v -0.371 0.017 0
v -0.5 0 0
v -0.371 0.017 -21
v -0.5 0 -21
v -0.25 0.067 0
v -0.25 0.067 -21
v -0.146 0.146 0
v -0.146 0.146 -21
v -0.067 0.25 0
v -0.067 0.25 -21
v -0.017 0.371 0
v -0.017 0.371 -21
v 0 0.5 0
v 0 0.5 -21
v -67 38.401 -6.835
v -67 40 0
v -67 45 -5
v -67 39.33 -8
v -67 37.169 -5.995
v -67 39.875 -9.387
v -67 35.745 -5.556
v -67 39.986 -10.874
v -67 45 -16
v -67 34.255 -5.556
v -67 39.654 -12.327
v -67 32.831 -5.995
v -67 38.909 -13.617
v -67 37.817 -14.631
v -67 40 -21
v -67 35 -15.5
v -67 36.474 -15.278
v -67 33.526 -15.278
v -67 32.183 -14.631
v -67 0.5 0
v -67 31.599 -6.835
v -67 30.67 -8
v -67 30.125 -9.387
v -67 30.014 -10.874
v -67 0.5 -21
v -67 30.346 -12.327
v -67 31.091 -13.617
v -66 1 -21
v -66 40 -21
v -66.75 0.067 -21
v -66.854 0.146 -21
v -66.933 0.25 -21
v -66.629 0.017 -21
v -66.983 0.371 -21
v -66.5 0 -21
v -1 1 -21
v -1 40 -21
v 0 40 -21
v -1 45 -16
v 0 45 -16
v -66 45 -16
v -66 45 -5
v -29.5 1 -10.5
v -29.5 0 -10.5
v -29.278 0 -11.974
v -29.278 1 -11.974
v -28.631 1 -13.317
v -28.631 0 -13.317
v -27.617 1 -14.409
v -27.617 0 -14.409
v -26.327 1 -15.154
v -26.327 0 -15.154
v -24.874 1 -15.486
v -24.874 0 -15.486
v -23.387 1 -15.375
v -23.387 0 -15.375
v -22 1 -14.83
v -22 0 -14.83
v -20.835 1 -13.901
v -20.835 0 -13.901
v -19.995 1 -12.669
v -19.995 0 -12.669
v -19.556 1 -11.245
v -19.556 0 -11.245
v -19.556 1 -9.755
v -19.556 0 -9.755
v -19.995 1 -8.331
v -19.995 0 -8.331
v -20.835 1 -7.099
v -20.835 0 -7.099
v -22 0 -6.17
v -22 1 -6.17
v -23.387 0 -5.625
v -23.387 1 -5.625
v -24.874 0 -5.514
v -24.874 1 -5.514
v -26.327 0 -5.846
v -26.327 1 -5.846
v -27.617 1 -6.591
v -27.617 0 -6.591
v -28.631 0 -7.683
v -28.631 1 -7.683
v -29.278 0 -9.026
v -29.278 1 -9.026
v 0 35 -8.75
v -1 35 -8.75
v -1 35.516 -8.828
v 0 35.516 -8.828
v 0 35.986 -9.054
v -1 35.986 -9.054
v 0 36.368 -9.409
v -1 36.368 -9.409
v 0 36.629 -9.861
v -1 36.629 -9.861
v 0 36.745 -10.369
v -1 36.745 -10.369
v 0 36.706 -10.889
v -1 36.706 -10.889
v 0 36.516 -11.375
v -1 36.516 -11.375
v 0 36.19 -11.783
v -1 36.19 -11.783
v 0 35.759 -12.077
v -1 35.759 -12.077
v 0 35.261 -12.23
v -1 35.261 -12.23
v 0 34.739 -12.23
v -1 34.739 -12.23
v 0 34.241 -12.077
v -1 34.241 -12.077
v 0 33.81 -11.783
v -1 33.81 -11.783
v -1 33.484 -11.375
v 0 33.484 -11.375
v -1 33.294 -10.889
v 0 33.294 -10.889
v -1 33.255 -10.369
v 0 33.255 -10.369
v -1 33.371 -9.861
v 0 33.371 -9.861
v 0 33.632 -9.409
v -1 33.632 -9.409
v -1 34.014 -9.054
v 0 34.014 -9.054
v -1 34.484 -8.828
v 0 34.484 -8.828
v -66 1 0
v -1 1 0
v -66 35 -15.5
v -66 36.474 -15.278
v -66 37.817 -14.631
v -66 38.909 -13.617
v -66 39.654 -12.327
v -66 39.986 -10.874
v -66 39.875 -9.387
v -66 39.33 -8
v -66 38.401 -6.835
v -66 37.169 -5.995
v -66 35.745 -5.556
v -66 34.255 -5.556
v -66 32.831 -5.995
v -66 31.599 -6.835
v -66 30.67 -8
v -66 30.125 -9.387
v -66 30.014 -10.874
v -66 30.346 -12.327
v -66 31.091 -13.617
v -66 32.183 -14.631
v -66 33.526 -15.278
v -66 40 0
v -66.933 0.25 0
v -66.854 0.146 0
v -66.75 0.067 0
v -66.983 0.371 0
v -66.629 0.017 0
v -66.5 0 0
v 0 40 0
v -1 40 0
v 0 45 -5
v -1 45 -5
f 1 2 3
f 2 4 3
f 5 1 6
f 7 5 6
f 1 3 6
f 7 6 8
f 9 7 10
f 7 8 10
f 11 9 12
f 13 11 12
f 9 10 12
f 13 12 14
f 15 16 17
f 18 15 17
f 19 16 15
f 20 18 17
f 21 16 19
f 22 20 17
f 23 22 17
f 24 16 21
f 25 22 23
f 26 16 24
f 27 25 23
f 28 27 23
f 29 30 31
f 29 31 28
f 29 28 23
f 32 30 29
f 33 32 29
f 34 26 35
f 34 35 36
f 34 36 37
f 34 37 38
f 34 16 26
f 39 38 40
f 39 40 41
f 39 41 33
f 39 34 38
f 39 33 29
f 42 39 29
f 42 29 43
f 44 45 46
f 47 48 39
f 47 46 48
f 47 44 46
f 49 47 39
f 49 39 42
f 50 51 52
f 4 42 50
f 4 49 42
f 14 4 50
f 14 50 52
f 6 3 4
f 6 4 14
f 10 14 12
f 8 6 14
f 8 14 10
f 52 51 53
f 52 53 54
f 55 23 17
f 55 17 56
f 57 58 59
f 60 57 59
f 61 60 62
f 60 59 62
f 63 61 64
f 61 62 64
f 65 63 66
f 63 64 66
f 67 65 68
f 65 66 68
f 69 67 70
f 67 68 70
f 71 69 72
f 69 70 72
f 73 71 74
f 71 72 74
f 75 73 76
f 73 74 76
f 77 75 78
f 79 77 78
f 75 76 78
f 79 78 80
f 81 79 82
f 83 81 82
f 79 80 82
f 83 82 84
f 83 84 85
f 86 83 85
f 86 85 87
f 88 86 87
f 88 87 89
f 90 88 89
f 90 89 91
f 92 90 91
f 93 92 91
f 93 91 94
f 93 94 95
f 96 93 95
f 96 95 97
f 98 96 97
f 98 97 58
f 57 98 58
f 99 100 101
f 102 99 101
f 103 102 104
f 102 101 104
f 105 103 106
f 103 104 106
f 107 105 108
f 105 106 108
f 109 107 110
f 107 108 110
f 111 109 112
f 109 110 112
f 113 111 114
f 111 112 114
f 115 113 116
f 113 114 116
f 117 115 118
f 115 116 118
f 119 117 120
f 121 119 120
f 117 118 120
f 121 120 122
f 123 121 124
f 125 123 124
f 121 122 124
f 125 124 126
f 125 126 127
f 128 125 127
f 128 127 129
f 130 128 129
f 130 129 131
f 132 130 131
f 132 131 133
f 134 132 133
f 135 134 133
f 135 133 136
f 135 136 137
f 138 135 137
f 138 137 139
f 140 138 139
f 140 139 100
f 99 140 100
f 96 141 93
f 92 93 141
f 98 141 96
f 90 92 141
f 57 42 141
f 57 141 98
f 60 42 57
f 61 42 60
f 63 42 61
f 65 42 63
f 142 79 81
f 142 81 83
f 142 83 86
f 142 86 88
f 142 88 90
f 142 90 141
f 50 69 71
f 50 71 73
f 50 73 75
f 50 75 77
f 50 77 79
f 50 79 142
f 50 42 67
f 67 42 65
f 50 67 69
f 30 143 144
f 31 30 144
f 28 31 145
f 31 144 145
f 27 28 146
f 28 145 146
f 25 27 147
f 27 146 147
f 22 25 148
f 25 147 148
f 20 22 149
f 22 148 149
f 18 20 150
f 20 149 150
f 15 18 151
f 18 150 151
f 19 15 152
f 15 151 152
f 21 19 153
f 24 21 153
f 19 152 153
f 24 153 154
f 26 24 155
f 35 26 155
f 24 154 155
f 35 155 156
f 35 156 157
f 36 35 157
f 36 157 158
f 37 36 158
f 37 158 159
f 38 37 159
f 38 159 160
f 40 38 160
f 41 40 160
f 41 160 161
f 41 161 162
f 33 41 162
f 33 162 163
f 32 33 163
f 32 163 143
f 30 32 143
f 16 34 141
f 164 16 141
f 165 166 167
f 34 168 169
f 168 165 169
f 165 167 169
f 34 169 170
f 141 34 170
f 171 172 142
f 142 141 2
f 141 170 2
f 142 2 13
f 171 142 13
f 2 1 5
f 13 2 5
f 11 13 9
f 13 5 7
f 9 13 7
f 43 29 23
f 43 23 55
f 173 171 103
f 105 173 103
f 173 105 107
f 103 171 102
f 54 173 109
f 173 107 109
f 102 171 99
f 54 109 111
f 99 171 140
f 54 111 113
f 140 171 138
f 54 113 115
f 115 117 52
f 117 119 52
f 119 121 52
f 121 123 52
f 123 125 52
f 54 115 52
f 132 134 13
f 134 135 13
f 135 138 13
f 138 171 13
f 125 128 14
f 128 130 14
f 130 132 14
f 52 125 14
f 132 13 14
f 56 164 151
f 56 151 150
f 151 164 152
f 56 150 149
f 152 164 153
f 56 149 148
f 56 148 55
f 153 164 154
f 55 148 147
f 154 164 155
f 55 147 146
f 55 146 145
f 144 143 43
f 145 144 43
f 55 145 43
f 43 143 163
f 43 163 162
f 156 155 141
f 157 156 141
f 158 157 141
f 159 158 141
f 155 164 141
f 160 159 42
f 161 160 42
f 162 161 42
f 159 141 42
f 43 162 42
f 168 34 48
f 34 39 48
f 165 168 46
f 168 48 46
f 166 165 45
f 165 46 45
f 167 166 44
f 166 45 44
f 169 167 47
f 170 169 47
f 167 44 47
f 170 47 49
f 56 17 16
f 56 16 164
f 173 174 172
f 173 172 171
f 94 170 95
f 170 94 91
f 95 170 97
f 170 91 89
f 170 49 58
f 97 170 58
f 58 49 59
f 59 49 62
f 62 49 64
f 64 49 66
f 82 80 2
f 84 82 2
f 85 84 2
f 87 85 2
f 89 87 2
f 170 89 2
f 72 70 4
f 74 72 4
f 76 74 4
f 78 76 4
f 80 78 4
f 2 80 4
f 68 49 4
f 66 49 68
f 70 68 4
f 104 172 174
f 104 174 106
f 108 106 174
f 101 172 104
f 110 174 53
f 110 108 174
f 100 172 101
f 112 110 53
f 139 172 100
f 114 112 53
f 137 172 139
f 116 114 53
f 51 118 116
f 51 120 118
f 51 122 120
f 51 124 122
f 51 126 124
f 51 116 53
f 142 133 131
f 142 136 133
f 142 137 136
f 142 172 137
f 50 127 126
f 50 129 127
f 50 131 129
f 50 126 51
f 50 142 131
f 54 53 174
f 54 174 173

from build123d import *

# Parameters (mm, degrees)
SKETCH_1_W                  = 67
SKETCH_1_H                  = 21
EXTRUDE_1_DEPTH             = 45
SHELL_1_T                   = -1
FILLET_1_R                  = 0.5
CHAMFER_1_SIZE              = 5
HOLE_WIZARD_10_0_10_1_D     = 10
HOLE_WIZARD_10_0_10_1_DEPTH = 1
HOLE_WIZARD_10_0_10_2_D     = 10
HOLE_WIZARD_3_5_3_5_1_D     = 3.5


with BuildPart() as part:
    # 草图1 → 凸台-拉伸1 (new body)
    with BuildSketch(Plane(origin=(0, 0, 0), x_dir=(1, 0, 0), z_dir=(0, 1, 0))):
        with Locations((-33.5, 10.5)):
            Rectangle(SKETCH_1_W, SKETCH_1_H)
    extrude(amount=EXTRUDE_1_DEPTH)

    # 抽壳1
    shell_1_openings = [part.faces().sort_by_distance(p)[0] for p in [
        (-33.5, 45, -10.5),
        (-33.5, 22.5, 0),
        (-33.5, 22.5, -21),
    ]]
    offset(amount=SHELL_1_T, openings=shell_1_openings, kind=Kind.INTERSECTION)

    # 圆角1
    fillet_1_edges = [part.edges().sort_by_distance(p)[0] for p in [
        (-67, 0, -10.5),
        (0, 0, -10.5),
    ]]
    fillet(fillet_1_edges, radius=FILLET_1_R)

    # 倒角1
    chamfer_1_edges = [part.edges().sort_by_distance(p)[0] for p in [
        (-66.5, 45, 0),
        (-66.5, 45, -21),
        (-0.5, 45, 0),
        (-0.5, 45, -21),
    ]]
    chamfer(chamfer_1_edges, length=CHAMFER_1_SIZE)

    # Ø10.0 (10) 直径槽口1
    with Locations(Plane.ZY.offset(67)):
        with Locations((-10.5, 35)):
            Hole(HOLE_WIZARD_10_0_10_1_D / 2, depth=HOLE_WIZARD_10_0_10_1_DEPTH)

    # Ø10.0 (10) 直径槽口2 (through all)
    with Locations(Plane(origin=(0, 1, 0), x_dir=(1, 0, 0), z_dir=(0, 1, 0))):
        with Locations((-24.5, 10.5)):
            Hole(HOLE_WIZARD_10_0_10_2_D / 2)

    # Ø3.5 (3.5) 直径槽口1 (through all)
    with Locations(Plane(origin=(0, 0, 0), x_dir=(0, 0, -1), z_dir=(1, 0, 0))):
        with Locations((10.5, 35)):
            Hole(HOLE_WIZARD_3_5_3_5_1_D / 2)


solid = part.part
